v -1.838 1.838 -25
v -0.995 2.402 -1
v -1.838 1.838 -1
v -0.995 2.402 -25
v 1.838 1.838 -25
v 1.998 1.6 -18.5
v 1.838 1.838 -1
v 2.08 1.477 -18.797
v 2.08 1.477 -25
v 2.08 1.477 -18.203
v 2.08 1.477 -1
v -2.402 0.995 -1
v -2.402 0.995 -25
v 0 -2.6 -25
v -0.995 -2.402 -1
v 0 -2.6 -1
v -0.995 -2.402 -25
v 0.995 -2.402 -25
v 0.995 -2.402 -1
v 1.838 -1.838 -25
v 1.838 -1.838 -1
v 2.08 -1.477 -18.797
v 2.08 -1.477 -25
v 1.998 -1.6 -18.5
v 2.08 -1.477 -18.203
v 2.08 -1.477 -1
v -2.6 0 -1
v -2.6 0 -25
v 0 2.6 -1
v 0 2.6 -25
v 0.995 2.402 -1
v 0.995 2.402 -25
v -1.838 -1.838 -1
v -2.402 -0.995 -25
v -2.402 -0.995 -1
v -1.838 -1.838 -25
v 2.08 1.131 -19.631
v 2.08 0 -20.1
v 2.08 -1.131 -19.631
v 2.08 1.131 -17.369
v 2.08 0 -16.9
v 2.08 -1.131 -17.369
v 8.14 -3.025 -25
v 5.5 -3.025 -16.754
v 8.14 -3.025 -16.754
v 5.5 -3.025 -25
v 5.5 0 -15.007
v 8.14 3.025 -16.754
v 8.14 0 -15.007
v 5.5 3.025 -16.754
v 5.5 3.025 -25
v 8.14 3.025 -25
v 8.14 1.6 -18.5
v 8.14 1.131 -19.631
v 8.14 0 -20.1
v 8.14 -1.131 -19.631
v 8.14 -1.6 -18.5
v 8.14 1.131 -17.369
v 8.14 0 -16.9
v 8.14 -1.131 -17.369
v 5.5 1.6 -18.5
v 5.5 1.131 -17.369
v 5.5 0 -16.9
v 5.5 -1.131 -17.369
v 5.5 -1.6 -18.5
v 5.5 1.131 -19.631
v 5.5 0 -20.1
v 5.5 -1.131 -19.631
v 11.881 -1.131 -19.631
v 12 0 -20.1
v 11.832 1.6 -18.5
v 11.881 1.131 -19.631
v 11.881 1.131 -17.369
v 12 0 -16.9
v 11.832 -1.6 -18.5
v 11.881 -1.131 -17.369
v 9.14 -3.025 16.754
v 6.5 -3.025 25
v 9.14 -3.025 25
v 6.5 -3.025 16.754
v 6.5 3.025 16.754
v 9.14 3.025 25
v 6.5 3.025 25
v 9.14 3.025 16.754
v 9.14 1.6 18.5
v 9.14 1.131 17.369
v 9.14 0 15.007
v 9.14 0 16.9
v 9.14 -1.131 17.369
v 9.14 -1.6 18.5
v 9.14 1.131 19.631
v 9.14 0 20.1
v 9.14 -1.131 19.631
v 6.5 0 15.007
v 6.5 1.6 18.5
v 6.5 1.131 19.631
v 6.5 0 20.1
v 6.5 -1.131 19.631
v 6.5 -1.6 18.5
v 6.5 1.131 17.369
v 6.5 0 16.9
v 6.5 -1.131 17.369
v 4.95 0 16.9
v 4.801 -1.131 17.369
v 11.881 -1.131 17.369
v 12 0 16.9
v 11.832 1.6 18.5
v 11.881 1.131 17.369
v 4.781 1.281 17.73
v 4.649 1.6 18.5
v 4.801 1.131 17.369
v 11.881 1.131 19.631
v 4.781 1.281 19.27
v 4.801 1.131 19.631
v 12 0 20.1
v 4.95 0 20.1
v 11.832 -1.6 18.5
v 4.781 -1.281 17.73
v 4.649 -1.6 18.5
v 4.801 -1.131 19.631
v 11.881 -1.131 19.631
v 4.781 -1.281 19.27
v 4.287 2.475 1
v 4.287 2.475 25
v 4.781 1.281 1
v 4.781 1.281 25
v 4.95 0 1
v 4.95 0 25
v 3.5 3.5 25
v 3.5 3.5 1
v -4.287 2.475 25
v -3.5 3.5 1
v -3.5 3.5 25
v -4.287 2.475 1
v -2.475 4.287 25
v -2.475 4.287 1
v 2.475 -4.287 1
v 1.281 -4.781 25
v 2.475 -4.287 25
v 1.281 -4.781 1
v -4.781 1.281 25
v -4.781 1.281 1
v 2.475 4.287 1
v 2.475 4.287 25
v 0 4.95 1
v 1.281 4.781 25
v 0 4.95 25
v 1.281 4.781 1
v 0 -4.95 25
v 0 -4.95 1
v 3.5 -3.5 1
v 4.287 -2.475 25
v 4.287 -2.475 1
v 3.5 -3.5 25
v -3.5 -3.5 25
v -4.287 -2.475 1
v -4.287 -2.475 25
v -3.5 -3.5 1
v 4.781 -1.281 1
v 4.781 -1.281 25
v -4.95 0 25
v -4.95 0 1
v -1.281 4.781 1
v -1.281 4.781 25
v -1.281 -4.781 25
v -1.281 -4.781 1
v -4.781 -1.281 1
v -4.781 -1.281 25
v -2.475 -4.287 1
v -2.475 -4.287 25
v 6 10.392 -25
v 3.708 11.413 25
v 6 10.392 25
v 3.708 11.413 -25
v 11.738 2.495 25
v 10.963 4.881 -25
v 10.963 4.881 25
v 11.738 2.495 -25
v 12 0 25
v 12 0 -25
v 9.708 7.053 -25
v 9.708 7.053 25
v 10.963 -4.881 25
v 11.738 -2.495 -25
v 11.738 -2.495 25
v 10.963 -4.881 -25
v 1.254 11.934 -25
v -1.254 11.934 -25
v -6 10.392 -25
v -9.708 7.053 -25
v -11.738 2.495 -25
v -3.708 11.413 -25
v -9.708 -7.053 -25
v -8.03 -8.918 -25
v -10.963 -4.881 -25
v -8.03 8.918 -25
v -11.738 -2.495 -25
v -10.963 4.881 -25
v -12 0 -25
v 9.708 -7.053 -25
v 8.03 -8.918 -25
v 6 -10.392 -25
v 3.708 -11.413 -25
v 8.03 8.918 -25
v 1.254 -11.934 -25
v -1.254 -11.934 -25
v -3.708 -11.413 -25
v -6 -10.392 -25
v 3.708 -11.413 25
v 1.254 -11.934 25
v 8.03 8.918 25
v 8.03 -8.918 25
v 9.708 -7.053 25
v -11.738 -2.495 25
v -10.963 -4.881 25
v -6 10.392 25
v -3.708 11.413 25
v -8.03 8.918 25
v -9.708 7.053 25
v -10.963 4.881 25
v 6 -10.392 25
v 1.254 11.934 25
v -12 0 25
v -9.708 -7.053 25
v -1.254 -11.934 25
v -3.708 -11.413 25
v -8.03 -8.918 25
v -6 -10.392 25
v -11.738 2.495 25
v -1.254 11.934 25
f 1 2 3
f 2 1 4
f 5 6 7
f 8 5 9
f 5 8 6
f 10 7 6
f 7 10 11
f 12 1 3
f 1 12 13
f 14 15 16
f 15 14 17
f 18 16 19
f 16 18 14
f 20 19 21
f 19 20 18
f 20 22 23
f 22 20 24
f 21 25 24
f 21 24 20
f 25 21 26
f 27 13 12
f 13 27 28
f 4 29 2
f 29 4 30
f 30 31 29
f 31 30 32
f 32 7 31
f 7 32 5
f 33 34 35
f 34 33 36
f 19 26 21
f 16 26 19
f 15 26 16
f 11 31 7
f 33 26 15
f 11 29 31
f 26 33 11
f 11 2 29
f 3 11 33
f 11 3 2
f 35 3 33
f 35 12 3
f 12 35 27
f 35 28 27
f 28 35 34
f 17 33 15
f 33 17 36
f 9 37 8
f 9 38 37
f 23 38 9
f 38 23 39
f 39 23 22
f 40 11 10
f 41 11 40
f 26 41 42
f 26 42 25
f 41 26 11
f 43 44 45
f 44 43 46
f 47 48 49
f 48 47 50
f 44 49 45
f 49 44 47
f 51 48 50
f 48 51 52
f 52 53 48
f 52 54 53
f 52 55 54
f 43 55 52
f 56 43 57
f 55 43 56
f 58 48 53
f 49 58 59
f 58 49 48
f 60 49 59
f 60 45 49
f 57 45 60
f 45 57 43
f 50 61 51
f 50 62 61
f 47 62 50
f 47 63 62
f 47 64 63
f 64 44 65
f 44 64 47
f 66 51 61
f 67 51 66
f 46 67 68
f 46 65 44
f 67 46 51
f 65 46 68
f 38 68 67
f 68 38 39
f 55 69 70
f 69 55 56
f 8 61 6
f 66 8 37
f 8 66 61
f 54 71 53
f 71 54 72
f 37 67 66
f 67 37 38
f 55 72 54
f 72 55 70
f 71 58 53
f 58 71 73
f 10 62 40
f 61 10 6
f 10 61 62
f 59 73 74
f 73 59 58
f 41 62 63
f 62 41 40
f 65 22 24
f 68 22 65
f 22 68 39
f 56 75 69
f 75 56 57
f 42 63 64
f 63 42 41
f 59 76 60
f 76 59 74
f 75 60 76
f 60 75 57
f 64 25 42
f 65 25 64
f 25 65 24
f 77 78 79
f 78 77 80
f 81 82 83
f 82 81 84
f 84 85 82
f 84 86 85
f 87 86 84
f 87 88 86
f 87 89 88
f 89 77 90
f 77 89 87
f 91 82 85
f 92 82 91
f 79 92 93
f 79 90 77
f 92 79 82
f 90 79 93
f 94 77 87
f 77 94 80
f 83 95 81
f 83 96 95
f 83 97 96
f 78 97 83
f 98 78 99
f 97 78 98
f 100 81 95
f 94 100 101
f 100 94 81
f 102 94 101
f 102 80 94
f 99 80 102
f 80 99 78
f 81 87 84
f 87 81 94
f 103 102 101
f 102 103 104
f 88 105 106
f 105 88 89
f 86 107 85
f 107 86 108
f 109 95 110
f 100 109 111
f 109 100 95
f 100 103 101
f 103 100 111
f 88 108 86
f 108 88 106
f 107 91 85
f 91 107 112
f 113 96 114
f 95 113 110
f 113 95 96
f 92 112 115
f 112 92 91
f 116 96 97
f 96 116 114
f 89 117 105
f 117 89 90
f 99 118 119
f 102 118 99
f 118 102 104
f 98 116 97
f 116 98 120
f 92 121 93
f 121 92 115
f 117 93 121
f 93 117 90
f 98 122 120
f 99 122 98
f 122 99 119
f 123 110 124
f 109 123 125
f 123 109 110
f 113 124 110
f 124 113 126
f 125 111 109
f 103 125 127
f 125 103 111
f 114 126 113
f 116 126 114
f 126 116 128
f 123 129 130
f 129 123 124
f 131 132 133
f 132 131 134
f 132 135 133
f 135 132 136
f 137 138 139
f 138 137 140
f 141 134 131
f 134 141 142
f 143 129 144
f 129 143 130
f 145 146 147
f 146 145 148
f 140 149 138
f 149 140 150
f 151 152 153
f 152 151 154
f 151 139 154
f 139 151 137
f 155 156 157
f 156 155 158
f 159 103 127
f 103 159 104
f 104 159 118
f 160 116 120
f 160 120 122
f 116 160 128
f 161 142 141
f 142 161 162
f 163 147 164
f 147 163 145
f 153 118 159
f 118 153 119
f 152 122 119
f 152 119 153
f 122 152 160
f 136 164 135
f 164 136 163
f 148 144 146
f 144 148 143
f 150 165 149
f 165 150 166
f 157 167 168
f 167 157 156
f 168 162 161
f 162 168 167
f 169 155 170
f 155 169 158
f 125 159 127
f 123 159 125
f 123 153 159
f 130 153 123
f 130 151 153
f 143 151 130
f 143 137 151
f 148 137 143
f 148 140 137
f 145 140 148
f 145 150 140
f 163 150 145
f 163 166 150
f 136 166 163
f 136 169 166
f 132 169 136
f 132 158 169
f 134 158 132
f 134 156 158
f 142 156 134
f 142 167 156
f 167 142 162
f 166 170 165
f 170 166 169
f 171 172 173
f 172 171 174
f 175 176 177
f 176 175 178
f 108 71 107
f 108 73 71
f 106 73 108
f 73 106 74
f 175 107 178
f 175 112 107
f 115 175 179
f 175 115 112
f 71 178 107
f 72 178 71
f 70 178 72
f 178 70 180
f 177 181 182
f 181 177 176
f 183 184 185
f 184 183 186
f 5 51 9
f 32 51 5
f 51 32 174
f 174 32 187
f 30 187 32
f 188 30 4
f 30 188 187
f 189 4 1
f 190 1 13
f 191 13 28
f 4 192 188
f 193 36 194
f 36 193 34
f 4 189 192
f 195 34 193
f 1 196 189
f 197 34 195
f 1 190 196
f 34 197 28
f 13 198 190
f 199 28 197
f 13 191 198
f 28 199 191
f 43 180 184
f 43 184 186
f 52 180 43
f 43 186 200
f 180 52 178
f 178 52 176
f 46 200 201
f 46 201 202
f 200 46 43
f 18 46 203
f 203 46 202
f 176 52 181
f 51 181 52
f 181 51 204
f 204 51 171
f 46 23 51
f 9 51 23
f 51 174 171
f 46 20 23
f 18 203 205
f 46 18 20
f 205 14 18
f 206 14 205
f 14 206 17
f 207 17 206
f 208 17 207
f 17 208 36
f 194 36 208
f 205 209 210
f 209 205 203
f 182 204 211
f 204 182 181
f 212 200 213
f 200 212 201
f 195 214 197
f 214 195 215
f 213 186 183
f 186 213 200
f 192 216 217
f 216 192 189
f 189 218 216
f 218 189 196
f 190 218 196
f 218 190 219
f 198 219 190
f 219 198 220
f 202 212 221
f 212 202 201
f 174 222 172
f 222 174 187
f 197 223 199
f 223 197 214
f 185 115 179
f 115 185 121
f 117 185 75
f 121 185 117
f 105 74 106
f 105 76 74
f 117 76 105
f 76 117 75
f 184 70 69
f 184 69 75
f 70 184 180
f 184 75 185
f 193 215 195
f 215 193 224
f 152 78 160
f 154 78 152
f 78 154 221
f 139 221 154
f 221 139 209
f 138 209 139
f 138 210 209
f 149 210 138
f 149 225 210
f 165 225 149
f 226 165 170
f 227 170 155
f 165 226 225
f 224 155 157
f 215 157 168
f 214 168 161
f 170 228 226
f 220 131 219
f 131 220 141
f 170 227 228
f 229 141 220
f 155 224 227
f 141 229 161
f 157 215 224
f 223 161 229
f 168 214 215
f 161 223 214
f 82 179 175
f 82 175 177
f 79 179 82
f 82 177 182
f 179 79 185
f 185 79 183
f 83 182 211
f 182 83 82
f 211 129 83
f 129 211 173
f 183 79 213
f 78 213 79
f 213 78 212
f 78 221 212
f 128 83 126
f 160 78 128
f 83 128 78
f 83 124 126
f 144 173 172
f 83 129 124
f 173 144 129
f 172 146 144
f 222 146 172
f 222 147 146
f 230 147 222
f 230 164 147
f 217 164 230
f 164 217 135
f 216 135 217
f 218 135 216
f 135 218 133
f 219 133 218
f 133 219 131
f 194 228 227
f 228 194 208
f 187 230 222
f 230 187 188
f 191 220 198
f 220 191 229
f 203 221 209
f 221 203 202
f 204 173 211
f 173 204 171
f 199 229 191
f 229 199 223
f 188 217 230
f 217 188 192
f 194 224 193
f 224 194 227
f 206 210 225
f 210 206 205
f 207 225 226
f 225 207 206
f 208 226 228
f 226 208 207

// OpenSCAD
// file: joiners.scad
include <config.scad>
use <GDMUtils.scad>


module joiner(h=40, w=10, l=10, a=30, screwsize=3, guides=true)
{
	dmnd_height = h/2;
	dmnd_width = dmnd_height*tan(a);
	guide_size = w/3;

	render(convexity=4) union() {
		difference() {
			union() {
				// Make base.
				difference() {
					union() {
						translate([0,-l/2,0]) cube(size=[w, l, h], center=true);
						translate([0,0,-h/4])
							scale([w, dmnd_width/2, dmnd_height/2])
								xrot(45) cube(size=[1,sqrt(2),sqrt(2)], center=true);
					}
					translate([0,0,h/4])
						scale([w*1.1, dmnd_width/2, dmnd_height/2])
							xrot(45) cube(size=[1,sqrt(2),sqrt(2)], center=true);
				}

				// Make tab
				translate([0,0,dmnd_height/2]) {
					translate([0, -dmnd_width/4, 0])
						cube(size=[w/3-joiner_slop, dmnd_width/2, dmnd_height], center=true);
					scale([w/3-joiner_slop, dmnd_width/2, dmnd_height/2]) xrot(45)
						cube(size=[1,sqrt(2),sqrt(2)], center=true);
				}

				// Guide ridges.
				if (guides == true) {
					translate([0,0,dmnd_height/2]) {
						grid_of(xa=[-(w/6-joiner_slop/2), (w/6-joiner_slop/2)]) {
							// Guide ridge.
							scale([0.75, 1, 2]) yrot(45)
								cube(size=[guide_size/sqrt(2), dmnd_width, guide_size/sqrt(2)], center=true);

							// Snap ridge.
							scale([0.25, 0.5, 1]) zrot(45)
								cube(size=[guide_size/sqrt(2), guide_size/sqrt(2), dmnd_width], center=true);
						}
					}
				}
			}

			// Make slot
			translate([0, 0, -dmnd_height/2]) {
				translate([0, dmnd_width/4, 0])
					cube(size=[w/3, dmnd_width/2, dmnd_height], center=true);
				scale([w/3, dmnd_width/2, dmnd_height/2]) xrot(45)
					cube(size=[1,sqrt(2),sqrt(2)], center=true);
			}

			// Blunt point of tab.
			translate([0,(2+dmnd_width/2-guide_size*tan(a)),0])
				cube(size=[w*1.1,4,h], center=true);

			// Make screwholes, if needed.
			if (screwsize != undef) {
				xrot_copies([0, 180])
					translate([0, 0, dmnd_height/2])
						yrot(90) cylinder(r=screwsize*1.1/2, h=w+1, center=true, $fn=12);
			}

			// Guide slots.
			if (guides == true) {
				translate([0,0,-dmnd_height/2]) {
					grid_of(xa=[-(w/6),(w/6)]) {
						// Guide slot
						scale([0.75, 1, 2]) yrot(45)
							cube(size=[guide_size/sqrt(2), dmnd_width*1.1, guide_size/sqrt(2)], center=true);

						// Snap hole
						scale([0.25, 0.5, 1]) zrot(45)
							cube(size=[guide_size/sqrt(2), guide_size/sqrt(2), dmnd_width], center=true);
					}
				}
			}
		}

		// Blunt point of slot.
		translate([0,-(2+dmnd_width/2-guide_size*tan(a)),0])
			cube(size=[w,4,h], center=true);
	}
}
joiner(screwsize=3);



// vim: noexpandtab tabstop=4 shiftwidth=4 softtabstop=4 nowrap
// file: config.scad
snappy_version = 0.90;


platform_length = 110; // mm.  Must be a multiple of rack_tooth_size.
platform_width  = 150; // mm
platform_height =  40; // mm
platform_thick  =   7; // mm
rack_tooth_size =   5; // mm per tooth.

rail_length  = 150;    // mm
rail_height  =  50;    // mm
rail_thick   =   7;    // mm

motor_rail_length = 100; // mm

roller_thick =  12;    // mm
roller_diam  =  30;    // mm
roller_axle  =  15;    // mm
roller_base  =  12;    // mm
roller_angle =  30;    // degrees

joiner_angle =  30;    // degrees
joiner_width =  10;    // mm
joiner_slop  =   0.5;  // mm

// Currently configured for 3/8" ACME threaded rod and matching 11/16" nut
lifter_rod_diam   =   9.5; // mm
lifter_rod_length = 300.0; // mm
lifter_nut_size   =  17.4; // mm
lifter_nut_thick  =   9.3; // mm




// Commonly used derived values.  Don't change these.
rail_spacing = platform_width - joiner_width*4 - 10;
roller_spacing = rail_spacing-roller_diam+0.5;
rail_width = rail_spacing + joiner_width*2;



// vim: noexpandtab tabstop=4 shiftwidth=4 softtabstop=4 nowrap
// main file
include <config.scad>
use <GDMUtils.scad>
use <joiners.scad>


module z_rod_coupler()
{
	h = 50;
	shaft = 5.2;
	setscrew = 3.2;

	color("Lavender") difference() {
		// Coupler cylinder.
		cylinder(h=h, r=12, center=true);

		translate([0, 0, -(h/4+1)]) {
			difference() {
				// Stepper shaft hole
				cylinder(h=h/2, r=shaft/2, center=true, $fn=16);

				// Shaft flat side.
				translate([1.4*shaft, 0, 0])
					cube(size=[shaft*2, shaft*2, h/2+1], center=true);
			}

			//Stepper set screw
			translate([5/2+2, 0, -(h/4-7.5)]) {
				yrot(90) {
					// Nut Slot
					translate([0, 0, 1]) scale([1.1, 1.1, 1.1]) hull() {
						metric_nut(size=3, hole=false);
						translate([10, 0, 0])
							metric_nut(size=3, hole=false);
					}

					// Set screw hole.
					translate([0, 0, 2.5])
						cylinder(r=setscrew/2, h=12, center=true, $fn=8);
				}
			}
		}

		translate([0, 0, (h/4+1)]) {
			// Lifter rod hole.
			cylinder(h=h/2, r=lifter_rod_diam/2+0.2, center=true, $fn=24);

			//Lifter rod set screw
			translate([5/2+3, 0, (h/4-7.5)]) {
				yrot(90) {
					// Nut Slot
					translate([0, 0, 1]) scale([1.1, 1.1, 1.1]) hull() {
						metric_nut(size=3, hole=false);
						translate([-10, 0, 0])
							metric_nut(size=3, hole=false);
					}

					// Set screw hole.
					translate([0, 0, 2.5])
						cylinder(r=setscrew/2, h=10, center=true, $fn=8);
				}
			}
		}
	}
}
//!z_rod_coupler();



module z_rod_couple_part() { // make me
	z_rod_coupler();
}



z_rod_couple_part();



// vim: noexpandtab tabstop=4 shiftwidth=4 softtabstop=4 nowrap
